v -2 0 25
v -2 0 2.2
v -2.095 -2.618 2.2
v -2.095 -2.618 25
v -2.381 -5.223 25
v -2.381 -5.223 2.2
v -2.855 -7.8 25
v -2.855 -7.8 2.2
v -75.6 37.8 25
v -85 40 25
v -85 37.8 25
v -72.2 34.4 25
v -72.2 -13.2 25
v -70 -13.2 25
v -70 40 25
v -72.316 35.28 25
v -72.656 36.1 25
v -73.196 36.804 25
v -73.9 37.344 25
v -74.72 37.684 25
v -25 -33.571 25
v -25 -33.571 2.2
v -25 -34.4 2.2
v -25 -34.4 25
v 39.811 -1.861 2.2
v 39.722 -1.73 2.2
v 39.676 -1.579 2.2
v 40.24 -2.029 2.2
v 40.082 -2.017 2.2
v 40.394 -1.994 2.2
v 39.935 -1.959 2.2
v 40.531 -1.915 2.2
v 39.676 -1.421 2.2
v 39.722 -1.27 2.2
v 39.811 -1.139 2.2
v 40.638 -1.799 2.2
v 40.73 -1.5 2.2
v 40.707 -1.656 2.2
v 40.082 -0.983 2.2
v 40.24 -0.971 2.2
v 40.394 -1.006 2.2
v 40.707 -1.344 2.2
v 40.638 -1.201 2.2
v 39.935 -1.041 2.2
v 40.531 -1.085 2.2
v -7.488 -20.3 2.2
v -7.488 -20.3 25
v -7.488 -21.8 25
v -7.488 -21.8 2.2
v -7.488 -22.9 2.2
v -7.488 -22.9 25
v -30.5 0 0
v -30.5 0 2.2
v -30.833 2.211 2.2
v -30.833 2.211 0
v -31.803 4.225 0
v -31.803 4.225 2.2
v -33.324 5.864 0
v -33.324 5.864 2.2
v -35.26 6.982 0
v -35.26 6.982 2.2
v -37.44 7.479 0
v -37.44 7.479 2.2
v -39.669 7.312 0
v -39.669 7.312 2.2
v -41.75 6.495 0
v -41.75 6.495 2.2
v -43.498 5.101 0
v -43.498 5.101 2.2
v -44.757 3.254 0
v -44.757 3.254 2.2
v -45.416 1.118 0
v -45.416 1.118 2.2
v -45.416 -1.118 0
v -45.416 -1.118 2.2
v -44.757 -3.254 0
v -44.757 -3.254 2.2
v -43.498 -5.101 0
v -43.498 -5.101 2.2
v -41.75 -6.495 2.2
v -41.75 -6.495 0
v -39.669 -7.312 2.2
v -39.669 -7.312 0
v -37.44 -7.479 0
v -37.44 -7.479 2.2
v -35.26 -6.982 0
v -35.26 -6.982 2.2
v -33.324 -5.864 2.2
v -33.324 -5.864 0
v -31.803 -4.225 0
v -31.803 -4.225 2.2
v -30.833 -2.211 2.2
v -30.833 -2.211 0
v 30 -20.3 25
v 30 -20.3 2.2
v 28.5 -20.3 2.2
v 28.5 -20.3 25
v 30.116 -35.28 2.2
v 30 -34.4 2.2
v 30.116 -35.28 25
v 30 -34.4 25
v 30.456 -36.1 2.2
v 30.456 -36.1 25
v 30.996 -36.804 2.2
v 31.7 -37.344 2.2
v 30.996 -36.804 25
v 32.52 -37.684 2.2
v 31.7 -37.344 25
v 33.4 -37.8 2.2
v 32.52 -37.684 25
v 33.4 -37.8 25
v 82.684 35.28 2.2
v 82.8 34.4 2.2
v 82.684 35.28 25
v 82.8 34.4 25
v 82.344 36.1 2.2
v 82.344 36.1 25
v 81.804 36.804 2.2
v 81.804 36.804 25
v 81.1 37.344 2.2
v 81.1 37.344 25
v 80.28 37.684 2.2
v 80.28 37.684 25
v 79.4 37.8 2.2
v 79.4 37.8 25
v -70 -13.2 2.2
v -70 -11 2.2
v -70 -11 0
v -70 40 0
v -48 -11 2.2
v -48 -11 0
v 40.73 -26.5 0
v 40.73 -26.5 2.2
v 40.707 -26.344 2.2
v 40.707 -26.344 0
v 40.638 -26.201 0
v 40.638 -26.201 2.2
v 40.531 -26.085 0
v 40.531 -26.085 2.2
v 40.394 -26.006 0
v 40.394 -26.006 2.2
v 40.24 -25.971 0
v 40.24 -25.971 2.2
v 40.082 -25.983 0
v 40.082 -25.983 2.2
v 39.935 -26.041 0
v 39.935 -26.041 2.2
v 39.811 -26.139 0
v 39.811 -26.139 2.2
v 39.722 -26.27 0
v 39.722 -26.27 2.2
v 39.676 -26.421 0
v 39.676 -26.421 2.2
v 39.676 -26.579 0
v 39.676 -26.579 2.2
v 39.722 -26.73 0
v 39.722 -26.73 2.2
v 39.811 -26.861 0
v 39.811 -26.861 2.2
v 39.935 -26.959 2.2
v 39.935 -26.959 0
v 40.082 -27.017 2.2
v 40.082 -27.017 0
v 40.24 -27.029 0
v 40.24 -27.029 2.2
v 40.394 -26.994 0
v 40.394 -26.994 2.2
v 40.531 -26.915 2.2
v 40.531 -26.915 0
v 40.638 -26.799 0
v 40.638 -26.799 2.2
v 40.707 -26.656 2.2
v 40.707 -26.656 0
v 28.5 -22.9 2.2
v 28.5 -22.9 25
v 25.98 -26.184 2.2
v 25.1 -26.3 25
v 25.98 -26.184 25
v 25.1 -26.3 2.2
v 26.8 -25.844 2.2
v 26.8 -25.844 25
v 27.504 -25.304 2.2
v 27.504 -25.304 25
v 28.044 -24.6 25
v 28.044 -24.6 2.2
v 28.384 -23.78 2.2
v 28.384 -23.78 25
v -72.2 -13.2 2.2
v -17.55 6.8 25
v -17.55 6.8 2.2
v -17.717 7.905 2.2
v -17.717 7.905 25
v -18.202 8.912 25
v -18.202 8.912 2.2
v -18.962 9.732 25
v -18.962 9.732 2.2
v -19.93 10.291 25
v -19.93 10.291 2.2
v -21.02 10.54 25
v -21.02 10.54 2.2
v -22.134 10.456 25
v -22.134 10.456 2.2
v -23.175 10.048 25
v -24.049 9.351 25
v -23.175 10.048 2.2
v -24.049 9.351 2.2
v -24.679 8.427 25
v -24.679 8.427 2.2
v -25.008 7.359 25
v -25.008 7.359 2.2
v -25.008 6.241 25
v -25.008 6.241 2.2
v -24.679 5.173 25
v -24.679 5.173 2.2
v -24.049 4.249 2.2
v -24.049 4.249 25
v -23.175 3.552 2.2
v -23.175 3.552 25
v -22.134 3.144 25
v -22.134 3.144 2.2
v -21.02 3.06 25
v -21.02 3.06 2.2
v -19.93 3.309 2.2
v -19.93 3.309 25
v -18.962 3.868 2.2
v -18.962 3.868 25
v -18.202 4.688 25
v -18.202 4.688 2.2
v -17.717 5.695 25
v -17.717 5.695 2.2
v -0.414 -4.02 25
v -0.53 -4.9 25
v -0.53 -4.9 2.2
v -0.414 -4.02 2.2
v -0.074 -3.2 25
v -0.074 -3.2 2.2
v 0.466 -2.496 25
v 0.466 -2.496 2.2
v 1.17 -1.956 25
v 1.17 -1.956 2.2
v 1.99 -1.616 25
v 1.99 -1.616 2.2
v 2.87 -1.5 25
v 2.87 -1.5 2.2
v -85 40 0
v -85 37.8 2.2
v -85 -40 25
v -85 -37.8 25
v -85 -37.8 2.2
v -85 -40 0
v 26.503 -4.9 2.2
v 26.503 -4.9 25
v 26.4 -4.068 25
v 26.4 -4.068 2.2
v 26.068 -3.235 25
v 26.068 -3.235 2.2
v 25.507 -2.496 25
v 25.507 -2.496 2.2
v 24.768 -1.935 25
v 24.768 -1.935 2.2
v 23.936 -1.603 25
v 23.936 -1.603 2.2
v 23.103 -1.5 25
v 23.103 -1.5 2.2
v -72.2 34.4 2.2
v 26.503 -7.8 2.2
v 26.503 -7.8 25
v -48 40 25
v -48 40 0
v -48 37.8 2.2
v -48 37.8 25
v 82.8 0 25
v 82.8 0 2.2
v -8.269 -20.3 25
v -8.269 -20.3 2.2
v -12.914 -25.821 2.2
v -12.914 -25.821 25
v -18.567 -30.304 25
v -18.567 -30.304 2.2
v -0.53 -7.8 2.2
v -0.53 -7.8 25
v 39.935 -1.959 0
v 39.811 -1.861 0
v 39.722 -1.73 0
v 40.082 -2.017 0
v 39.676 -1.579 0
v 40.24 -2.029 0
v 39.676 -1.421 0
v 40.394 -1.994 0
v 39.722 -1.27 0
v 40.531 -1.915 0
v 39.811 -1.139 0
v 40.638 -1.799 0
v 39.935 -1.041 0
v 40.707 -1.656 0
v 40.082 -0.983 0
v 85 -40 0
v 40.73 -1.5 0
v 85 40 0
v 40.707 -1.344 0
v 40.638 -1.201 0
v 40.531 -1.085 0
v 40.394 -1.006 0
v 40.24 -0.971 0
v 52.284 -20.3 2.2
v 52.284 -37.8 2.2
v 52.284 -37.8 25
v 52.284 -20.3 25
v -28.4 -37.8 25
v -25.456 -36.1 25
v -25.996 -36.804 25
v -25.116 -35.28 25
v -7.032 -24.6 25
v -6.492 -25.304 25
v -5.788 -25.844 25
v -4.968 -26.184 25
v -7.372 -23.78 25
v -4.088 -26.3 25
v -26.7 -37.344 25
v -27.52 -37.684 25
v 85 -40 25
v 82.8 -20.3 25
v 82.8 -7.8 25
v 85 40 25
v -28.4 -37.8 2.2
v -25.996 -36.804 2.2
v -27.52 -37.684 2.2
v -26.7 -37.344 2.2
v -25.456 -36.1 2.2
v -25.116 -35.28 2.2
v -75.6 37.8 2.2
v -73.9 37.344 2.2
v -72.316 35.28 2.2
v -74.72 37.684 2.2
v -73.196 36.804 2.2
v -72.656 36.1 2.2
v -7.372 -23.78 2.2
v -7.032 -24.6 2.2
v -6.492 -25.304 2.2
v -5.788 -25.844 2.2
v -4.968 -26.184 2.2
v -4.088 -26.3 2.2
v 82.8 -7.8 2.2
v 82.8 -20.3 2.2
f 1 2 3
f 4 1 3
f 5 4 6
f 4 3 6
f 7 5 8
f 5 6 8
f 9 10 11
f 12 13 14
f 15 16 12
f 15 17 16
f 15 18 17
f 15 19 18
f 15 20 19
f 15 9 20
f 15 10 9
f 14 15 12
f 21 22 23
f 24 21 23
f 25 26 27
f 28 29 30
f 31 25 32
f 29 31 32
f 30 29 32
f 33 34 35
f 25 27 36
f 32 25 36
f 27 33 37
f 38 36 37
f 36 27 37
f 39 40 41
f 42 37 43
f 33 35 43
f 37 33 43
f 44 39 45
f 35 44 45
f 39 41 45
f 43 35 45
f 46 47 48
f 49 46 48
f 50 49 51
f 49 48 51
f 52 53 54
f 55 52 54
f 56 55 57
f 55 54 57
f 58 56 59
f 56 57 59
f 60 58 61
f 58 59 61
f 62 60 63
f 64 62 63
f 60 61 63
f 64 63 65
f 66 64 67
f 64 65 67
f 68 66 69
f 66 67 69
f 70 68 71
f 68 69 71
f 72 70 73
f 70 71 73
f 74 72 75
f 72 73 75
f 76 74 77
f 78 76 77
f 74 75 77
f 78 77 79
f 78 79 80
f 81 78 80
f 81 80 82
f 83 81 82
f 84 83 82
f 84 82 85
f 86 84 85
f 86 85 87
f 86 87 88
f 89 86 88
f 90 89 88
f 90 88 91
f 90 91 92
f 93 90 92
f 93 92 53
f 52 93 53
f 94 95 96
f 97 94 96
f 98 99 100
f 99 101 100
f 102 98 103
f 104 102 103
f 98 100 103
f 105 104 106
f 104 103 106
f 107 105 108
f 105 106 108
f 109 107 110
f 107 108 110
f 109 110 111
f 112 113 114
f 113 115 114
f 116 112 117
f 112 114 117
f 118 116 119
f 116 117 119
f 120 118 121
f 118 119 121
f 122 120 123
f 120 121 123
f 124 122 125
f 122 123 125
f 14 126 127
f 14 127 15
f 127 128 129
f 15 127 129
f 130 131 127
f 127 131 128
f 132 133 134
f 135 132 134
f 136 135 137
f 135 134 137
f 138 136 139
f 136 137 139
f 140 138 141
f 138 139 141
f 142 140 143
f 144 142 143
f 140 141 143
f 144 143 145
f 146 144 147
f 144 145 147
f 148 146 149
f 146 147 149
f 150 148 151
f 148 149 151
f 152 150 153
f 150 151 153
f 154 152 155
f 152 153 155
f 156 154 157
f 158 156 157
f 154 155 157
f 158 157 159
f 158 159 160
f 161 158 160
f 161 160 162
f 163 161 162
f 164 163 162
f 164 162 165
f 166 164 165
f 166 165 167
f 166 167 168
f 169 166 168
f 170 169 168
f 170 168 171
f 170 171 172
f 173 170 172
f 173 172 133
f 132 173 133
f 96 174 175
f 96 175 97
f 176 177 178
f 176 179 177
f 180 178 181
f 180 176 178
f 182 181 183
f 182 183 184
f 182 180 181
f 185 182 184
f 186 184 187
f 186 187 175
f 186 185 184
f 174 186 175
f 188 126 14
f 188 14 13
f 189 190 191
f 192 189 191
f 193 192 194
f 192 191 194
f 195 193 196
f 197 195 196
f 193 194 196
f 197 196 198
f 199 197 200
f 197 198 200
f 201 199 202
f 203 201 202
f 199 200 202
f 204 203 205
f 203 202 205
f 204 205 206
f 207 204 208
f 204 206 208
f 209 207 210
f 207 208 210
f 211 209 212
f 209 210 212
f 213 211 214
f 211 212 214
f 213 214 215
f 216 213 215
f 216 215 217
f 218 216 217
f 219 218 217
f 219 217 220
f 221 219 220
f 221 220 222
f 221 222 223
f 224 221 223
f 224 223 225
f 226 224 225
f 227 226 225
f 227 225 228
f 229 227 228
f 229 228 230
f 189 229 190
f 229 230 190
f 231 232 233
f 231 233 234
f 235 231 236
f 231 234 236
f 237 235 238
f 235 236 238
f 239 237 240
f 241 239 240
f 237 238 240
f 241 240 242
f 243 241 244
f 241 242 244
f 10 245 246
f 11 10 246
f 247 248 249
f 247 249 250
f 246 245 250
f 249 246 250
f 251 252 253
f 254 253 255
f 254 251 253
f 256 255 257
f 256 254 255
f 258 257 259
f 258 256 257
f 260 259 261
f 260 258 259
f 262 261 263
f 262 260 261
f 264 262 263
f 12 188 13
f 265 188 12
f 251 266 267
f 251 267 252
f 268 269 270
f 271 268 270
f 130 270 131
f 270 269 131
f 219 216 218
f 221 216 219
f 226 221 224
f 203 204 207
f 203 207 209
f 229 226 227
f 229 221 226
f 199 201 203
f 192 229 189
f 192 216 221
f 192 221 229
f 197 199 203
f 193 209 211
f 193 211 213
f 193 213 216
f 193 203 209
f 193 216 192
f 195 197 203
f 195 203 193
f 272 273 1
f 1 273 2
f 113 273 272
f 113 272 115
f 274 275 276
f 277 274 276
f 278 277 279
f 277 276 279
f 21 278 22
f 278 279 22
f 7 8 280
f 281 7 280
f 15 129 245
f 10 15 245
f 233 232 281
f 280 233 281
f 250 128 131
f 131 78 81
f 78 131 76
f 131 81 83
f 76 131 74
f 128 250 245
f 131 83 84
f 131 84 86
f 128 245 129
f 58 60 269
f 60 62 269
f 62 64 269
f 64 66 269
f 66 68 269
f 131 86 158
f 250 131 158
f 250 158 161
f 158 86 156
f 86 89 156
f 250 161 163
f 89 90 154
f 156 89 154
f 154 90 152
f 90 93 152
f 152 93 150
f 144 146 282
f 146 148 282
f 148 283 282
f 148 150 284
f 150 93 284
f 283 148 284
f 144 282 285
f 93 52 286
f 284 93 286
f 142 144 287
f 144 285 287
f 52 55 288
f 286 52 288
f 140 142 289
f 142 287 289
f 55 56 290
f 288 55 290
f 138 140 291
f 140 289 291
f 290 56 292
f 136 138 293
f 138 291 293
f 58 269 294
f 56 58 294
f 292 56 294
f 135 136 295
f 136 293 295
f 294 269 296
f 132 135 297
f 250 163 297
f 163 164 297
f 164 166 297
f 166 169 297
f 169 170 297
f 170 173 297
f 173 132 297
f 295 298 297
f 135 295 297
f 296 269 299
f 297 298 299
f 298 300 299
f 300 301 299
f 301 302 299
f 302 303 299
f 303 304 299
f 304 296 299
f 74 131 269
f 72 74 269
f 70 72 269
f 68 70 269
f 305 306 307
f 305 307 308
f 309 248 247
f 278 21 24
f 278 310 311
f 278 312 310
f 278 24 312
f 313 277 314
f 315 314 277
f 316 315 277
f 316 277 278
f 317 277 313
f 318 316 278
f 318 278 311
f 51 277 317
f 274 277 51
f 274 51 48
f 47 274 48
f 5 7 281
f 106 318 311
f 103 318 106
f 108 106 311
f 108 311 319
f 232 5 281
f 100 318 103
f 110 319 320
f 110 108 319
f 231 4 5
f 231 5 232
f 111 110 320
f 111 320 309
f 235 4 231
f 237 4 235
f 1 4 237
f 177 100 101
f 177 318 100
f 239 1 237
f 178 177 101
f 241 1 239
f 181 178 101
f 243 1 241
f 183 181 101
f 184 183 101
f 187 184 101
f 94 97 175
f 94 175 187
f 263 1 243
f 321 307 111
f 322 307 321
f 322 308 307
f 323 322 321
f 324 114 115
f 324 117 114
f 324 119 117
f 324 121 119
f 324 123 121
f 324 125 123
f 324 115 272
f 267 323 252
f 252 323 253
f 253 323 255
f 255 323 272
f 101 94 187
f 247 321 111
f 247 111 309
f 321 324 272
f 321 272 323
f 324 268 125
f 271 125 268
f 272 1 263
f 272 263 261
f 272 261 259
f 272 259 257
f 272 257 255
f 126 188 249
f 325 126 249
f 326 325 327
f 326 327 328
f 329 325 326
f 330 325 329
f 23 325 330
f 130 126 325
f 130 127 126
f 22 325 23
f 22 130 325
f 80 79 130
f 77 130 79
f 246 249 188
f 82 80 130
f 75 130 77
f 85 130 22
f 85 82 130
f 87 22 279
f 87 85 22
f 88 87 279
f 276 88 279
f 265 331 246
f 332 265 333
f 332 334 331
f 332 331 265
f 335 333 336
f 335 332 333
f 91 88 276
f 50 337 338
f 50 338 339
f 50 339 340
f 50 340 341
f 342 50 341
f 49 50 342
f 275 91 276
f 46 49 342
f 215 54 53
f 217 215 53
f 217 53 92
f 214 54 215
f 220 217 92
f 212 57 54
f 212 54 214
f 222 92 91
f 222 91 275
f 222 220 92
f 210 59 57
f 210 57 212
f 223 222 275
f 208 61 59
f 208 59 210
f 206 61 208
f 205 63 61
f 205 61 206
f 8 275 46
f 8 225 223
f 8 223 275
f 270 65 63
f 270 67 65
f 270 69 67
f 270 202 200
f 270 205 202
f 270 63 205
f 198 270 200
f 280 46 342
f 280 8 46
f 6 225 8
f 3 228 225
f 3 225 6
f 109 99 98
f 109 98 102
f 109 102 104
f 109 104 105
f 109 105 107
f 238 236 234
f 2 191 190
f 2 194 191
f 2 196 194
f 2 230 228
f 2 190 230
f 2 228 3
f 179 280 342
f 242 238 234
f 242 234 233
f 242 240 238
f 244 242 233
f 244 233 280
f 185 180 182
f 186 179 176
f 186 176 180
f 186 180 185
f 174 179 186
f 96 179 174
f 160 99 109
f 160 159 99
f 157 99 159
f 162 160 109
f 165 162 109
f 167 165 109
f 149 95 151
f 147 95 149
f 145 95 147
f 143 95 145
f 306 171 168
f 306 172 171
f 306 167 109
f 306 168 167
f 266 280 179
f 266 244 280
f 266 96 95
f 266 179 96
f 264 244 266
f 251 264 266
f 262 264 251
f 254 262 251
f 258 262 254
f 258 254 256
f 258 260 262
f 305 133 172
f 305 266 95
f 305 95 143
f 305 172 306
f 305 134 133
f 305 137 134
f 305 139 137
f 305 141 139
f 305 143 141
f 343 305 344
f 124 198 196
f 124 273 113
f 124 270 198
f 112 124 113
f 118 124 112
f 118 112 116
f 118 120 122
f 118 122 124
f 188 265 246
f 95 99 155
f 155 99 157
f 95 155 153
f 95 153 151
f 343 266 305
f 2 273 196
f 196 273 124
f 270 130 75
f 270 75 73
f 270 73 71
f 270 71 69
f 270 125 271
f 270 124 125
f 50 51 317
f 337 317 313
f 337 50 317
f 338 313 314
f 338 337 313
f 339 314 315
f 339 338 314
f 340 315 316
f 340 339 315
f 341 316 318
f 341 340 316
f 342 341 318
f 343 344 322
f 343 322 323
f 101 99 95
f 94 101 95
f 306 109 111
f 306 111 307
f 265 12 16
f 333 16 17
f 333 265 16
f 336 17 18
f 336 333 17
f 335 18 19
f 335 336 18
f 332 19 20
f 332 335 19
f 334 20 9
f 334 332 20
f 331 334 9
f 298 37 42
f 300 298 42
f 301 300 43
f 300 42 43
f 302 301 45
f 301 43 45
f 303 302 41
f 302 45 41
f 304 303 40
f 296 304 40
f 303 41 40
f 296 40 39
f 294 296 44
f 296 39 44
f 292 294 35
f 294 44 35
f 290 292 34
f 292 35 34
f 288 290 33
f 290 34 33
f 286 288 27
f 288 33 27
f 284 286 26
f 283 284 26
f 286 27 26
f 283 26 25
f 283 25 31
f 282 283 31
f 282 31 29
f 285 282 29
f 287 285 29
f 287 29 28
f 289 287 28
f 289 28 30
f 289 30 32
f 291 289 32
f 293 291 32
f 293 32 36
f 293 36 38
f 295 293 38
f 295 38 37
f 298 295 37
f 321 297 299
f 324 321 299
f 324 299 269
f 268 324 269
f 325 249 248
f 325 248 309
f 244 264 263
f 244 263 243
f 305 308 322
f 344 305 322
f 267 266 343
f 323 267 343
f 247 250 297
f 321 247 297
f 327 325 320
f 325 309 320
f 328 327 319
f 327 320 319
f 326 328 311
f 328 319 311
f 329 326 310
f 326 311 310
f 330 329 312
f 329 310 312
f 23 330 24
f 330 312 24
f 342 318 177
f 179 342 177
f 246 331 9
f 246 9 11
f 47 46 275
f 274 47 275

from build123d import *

# Parameters (mm, degrees)
F1_DEPTH  = 25
F2_T      = -2.2
F3_R      = 7.5
F4_DEPTH  = 25
F5_R      = 3.75
F6_DEPTH  = 22.8
F7_W      = 35
F7_H      = 17.5
F8_DEPTH  = 22.8
F9_W      = 24.2
F9_H      = 51
F10_DEPTH = 22.8
F11_W     = 27.0332266644
F11_H     = 1.5
F11_W_2   = 6.9575315177
F11_W_3   = 1.9967853452
F12_DEPTH = 22.8
F13_R     = 3.4
F14_R     = 0.5301707608
F15_DEPTH = 25
F16_W     = 58.4967853452
F16_H     = 7.8
F16_W_2   = 30.5156996727
F16_H_2   = 17.5
F17_DEPTH = 22.8
F18_W     = 5.6
F18_H     = 75.6
F19_DEPTH = 22.8


with BuildPart() as f1:
    # F0 (on Top) → F1 (new body)
    with BuildSketch(Plane.XY):
        Polygon((-70, 40), (-85, 40), (-85, -40), (85, -40), (85, 40), (-48, 40), (-48, -11), (-70, -11), align=None)
    extrude(amount=F1_DEPTH)

    # F2
    f2_openings = [f1.faces().sort_by_distance(p)[0] for p in [
        (5.305177, -1.303815, 25),
    ]]
    offset(amount=F2_T, openings=f2_openings, kind=Kind.INTERSECTION)

    # F3 (on face) → F4 (cut)
    with BuildSketch(Plane.XY.offset(2.2)):
        with Locations((-38, 0)):
            Circle(F3_R)
    extrude(amount=-F4_DEPTH, mode=Mode.SUBTRACT)

    # F5 (on face) → F6 (join, through all)
    with BuildSketch(Plane.XY.offset(2.2)):
        with Locations((-21.3, 6.8)):
            Circle(F5_R)
    extrude(amount=F6_DEPTH)

    # F7 (on face) → F8 (join, through all)
    with BuildSketch(Plane.XY.offset(2.2)):
        with Locations((12.5, -29.05)):
            Rectangle(F7_W, F7_H)
        with BuildLine():
            Line((-5, -20.3), (-8.2693760577, -20.3))
            ThreePointArc((-8.2693760577, -20.3), (-15.628025883, -28.2045169096), (-25, -33.5708206632))
            Line((-25, -33.5708206632), (-25, -37.8))
            Line((-25, -37.8), (-5, -37.8))
            Line((-5, -37.8), (-5, -20.3))
        make_face()
        with BuildLine():
            Line((28.1302789037, 0), (-2, 0))
            ThreePointArc((-2, 0), (-2.2144278138, -3.9233688725), (-2.8551568505, -7.8))
            Line((-2.8551568505, -7.8), (29.5341439003, -7.8))
            ThreePointArc((29.5341439003, -7.8), (28.1976713274, -4.0142062307), (28.1302789037, 0))
        make_face()
    extrude(amount=F8_DEPTH)

    # F9 (on face) → F10 (cut, through all)
    with BuildSketch(Plane.XY.offset(25)):
        with Locations((-57.9, 12.3)):
            Rectangle(F9_W, F9_H)
    extrude(amount=-F10_DEPTH, mode=Mode.SUBTRACT)

    # F11 (on face) → F12 (cut, through all)
    with BuildSketch(Plane.XY.offset(25)):
        with BuildLine():
            Line((-0.5300120096, -6.3), (26.5032146548, -6.3))
            Line((26.5032146548, -6.3), (26.5032146548, -2.1))
            ThreePointArc((26.5032146548, -2.1), (26.5, -1.8), (26.5032146548, -1.5))
            Line((26.5032146548, -1.5), (-0.5300120096, -1.5))
            Line((-0.5300120096, -1.5), (-0.5300120096, -6.3))
        make_face()
        with Locations((12.9866013226, -7.05)):
            Rectangle(F11_W, F11_H)
        with Locations((12.9866013226, -21.05)):
            Rectangle(F11_W, F11_H)
        Polygon((28.5, -21.8), (26.5032146548, -21.8), (-0.5300120096, -21.8), (-7.4875435273, -21.8), (-7.4875435273, -26.3), (28.5, -26.3), align=None)
        with Locations((-4.0087777684, -21.05)):
            Rectangle(F11_W_2, F11_H)
        with Locations((27.5016073274, -21.05)):
            Rectangle(F11_W_3, F11_H)
    extrude(amount=-F12_DEPTH, mode=Mode.SUBTRACT)

    # F13
    f13_edges = [f1.edges().sort_by_distance(p)[0] for p in [
        (-0.530012, -1.5, 13.6),
        (26.503215, -1.5, 13.6),
        (26.503215, -2.1, 13.6),
        (28.5, -26.3, 13.6),
        (-7.487544, -26.3, 13.6),
        (30, -37.8, 13.6),
        (82.8, -37.8, 13.6),
        (82.8, 37.8, 13.6),
        (-72.2, 37.8, 13.6),
        (-82.8, 37.8, 13.6),
        (-82.8, -37.8, 13.6),
        (-25, -37.8, 13.6),
    ]]
    fillet(f13_edges, radius=F13_R)

    # F14 (on face) → F15 (cut)
    with BuildSketch(Plane.XY.offset(2.2)):
        with Locations((40.2, -1.5)):
            Circle(F14_R)
        with Locations((40.2, -26.5)):
            Circle(F14_R)
    extrude(amount=-F15_DEPTH, mode=Mode.SUBTRACT)

    # F16 (on face) → F17 (join, through all)
    with BuildSketch(Plane.XY.offset(25)):
        with Locations((55.7516073274, -3.9)):
            Rectangle(F16_W, F16_H)
        with Locations((67.5421501637, -29.05)):
            Rectangle(F16_W_2, F16_H_2)
    extrude(amount=-F17_DEPTH)

    # F18 (on face) → F19 (cut, through all)
    with BuildSketch(Plane.XY.offset(25)):
        with Locations((-82.2, 0)):
            Rectangle(F18_W, F18_H)
    extrude(amount=-F19_DEPTH, mode=Mode.SUBTRACT)


solid = f1.part
